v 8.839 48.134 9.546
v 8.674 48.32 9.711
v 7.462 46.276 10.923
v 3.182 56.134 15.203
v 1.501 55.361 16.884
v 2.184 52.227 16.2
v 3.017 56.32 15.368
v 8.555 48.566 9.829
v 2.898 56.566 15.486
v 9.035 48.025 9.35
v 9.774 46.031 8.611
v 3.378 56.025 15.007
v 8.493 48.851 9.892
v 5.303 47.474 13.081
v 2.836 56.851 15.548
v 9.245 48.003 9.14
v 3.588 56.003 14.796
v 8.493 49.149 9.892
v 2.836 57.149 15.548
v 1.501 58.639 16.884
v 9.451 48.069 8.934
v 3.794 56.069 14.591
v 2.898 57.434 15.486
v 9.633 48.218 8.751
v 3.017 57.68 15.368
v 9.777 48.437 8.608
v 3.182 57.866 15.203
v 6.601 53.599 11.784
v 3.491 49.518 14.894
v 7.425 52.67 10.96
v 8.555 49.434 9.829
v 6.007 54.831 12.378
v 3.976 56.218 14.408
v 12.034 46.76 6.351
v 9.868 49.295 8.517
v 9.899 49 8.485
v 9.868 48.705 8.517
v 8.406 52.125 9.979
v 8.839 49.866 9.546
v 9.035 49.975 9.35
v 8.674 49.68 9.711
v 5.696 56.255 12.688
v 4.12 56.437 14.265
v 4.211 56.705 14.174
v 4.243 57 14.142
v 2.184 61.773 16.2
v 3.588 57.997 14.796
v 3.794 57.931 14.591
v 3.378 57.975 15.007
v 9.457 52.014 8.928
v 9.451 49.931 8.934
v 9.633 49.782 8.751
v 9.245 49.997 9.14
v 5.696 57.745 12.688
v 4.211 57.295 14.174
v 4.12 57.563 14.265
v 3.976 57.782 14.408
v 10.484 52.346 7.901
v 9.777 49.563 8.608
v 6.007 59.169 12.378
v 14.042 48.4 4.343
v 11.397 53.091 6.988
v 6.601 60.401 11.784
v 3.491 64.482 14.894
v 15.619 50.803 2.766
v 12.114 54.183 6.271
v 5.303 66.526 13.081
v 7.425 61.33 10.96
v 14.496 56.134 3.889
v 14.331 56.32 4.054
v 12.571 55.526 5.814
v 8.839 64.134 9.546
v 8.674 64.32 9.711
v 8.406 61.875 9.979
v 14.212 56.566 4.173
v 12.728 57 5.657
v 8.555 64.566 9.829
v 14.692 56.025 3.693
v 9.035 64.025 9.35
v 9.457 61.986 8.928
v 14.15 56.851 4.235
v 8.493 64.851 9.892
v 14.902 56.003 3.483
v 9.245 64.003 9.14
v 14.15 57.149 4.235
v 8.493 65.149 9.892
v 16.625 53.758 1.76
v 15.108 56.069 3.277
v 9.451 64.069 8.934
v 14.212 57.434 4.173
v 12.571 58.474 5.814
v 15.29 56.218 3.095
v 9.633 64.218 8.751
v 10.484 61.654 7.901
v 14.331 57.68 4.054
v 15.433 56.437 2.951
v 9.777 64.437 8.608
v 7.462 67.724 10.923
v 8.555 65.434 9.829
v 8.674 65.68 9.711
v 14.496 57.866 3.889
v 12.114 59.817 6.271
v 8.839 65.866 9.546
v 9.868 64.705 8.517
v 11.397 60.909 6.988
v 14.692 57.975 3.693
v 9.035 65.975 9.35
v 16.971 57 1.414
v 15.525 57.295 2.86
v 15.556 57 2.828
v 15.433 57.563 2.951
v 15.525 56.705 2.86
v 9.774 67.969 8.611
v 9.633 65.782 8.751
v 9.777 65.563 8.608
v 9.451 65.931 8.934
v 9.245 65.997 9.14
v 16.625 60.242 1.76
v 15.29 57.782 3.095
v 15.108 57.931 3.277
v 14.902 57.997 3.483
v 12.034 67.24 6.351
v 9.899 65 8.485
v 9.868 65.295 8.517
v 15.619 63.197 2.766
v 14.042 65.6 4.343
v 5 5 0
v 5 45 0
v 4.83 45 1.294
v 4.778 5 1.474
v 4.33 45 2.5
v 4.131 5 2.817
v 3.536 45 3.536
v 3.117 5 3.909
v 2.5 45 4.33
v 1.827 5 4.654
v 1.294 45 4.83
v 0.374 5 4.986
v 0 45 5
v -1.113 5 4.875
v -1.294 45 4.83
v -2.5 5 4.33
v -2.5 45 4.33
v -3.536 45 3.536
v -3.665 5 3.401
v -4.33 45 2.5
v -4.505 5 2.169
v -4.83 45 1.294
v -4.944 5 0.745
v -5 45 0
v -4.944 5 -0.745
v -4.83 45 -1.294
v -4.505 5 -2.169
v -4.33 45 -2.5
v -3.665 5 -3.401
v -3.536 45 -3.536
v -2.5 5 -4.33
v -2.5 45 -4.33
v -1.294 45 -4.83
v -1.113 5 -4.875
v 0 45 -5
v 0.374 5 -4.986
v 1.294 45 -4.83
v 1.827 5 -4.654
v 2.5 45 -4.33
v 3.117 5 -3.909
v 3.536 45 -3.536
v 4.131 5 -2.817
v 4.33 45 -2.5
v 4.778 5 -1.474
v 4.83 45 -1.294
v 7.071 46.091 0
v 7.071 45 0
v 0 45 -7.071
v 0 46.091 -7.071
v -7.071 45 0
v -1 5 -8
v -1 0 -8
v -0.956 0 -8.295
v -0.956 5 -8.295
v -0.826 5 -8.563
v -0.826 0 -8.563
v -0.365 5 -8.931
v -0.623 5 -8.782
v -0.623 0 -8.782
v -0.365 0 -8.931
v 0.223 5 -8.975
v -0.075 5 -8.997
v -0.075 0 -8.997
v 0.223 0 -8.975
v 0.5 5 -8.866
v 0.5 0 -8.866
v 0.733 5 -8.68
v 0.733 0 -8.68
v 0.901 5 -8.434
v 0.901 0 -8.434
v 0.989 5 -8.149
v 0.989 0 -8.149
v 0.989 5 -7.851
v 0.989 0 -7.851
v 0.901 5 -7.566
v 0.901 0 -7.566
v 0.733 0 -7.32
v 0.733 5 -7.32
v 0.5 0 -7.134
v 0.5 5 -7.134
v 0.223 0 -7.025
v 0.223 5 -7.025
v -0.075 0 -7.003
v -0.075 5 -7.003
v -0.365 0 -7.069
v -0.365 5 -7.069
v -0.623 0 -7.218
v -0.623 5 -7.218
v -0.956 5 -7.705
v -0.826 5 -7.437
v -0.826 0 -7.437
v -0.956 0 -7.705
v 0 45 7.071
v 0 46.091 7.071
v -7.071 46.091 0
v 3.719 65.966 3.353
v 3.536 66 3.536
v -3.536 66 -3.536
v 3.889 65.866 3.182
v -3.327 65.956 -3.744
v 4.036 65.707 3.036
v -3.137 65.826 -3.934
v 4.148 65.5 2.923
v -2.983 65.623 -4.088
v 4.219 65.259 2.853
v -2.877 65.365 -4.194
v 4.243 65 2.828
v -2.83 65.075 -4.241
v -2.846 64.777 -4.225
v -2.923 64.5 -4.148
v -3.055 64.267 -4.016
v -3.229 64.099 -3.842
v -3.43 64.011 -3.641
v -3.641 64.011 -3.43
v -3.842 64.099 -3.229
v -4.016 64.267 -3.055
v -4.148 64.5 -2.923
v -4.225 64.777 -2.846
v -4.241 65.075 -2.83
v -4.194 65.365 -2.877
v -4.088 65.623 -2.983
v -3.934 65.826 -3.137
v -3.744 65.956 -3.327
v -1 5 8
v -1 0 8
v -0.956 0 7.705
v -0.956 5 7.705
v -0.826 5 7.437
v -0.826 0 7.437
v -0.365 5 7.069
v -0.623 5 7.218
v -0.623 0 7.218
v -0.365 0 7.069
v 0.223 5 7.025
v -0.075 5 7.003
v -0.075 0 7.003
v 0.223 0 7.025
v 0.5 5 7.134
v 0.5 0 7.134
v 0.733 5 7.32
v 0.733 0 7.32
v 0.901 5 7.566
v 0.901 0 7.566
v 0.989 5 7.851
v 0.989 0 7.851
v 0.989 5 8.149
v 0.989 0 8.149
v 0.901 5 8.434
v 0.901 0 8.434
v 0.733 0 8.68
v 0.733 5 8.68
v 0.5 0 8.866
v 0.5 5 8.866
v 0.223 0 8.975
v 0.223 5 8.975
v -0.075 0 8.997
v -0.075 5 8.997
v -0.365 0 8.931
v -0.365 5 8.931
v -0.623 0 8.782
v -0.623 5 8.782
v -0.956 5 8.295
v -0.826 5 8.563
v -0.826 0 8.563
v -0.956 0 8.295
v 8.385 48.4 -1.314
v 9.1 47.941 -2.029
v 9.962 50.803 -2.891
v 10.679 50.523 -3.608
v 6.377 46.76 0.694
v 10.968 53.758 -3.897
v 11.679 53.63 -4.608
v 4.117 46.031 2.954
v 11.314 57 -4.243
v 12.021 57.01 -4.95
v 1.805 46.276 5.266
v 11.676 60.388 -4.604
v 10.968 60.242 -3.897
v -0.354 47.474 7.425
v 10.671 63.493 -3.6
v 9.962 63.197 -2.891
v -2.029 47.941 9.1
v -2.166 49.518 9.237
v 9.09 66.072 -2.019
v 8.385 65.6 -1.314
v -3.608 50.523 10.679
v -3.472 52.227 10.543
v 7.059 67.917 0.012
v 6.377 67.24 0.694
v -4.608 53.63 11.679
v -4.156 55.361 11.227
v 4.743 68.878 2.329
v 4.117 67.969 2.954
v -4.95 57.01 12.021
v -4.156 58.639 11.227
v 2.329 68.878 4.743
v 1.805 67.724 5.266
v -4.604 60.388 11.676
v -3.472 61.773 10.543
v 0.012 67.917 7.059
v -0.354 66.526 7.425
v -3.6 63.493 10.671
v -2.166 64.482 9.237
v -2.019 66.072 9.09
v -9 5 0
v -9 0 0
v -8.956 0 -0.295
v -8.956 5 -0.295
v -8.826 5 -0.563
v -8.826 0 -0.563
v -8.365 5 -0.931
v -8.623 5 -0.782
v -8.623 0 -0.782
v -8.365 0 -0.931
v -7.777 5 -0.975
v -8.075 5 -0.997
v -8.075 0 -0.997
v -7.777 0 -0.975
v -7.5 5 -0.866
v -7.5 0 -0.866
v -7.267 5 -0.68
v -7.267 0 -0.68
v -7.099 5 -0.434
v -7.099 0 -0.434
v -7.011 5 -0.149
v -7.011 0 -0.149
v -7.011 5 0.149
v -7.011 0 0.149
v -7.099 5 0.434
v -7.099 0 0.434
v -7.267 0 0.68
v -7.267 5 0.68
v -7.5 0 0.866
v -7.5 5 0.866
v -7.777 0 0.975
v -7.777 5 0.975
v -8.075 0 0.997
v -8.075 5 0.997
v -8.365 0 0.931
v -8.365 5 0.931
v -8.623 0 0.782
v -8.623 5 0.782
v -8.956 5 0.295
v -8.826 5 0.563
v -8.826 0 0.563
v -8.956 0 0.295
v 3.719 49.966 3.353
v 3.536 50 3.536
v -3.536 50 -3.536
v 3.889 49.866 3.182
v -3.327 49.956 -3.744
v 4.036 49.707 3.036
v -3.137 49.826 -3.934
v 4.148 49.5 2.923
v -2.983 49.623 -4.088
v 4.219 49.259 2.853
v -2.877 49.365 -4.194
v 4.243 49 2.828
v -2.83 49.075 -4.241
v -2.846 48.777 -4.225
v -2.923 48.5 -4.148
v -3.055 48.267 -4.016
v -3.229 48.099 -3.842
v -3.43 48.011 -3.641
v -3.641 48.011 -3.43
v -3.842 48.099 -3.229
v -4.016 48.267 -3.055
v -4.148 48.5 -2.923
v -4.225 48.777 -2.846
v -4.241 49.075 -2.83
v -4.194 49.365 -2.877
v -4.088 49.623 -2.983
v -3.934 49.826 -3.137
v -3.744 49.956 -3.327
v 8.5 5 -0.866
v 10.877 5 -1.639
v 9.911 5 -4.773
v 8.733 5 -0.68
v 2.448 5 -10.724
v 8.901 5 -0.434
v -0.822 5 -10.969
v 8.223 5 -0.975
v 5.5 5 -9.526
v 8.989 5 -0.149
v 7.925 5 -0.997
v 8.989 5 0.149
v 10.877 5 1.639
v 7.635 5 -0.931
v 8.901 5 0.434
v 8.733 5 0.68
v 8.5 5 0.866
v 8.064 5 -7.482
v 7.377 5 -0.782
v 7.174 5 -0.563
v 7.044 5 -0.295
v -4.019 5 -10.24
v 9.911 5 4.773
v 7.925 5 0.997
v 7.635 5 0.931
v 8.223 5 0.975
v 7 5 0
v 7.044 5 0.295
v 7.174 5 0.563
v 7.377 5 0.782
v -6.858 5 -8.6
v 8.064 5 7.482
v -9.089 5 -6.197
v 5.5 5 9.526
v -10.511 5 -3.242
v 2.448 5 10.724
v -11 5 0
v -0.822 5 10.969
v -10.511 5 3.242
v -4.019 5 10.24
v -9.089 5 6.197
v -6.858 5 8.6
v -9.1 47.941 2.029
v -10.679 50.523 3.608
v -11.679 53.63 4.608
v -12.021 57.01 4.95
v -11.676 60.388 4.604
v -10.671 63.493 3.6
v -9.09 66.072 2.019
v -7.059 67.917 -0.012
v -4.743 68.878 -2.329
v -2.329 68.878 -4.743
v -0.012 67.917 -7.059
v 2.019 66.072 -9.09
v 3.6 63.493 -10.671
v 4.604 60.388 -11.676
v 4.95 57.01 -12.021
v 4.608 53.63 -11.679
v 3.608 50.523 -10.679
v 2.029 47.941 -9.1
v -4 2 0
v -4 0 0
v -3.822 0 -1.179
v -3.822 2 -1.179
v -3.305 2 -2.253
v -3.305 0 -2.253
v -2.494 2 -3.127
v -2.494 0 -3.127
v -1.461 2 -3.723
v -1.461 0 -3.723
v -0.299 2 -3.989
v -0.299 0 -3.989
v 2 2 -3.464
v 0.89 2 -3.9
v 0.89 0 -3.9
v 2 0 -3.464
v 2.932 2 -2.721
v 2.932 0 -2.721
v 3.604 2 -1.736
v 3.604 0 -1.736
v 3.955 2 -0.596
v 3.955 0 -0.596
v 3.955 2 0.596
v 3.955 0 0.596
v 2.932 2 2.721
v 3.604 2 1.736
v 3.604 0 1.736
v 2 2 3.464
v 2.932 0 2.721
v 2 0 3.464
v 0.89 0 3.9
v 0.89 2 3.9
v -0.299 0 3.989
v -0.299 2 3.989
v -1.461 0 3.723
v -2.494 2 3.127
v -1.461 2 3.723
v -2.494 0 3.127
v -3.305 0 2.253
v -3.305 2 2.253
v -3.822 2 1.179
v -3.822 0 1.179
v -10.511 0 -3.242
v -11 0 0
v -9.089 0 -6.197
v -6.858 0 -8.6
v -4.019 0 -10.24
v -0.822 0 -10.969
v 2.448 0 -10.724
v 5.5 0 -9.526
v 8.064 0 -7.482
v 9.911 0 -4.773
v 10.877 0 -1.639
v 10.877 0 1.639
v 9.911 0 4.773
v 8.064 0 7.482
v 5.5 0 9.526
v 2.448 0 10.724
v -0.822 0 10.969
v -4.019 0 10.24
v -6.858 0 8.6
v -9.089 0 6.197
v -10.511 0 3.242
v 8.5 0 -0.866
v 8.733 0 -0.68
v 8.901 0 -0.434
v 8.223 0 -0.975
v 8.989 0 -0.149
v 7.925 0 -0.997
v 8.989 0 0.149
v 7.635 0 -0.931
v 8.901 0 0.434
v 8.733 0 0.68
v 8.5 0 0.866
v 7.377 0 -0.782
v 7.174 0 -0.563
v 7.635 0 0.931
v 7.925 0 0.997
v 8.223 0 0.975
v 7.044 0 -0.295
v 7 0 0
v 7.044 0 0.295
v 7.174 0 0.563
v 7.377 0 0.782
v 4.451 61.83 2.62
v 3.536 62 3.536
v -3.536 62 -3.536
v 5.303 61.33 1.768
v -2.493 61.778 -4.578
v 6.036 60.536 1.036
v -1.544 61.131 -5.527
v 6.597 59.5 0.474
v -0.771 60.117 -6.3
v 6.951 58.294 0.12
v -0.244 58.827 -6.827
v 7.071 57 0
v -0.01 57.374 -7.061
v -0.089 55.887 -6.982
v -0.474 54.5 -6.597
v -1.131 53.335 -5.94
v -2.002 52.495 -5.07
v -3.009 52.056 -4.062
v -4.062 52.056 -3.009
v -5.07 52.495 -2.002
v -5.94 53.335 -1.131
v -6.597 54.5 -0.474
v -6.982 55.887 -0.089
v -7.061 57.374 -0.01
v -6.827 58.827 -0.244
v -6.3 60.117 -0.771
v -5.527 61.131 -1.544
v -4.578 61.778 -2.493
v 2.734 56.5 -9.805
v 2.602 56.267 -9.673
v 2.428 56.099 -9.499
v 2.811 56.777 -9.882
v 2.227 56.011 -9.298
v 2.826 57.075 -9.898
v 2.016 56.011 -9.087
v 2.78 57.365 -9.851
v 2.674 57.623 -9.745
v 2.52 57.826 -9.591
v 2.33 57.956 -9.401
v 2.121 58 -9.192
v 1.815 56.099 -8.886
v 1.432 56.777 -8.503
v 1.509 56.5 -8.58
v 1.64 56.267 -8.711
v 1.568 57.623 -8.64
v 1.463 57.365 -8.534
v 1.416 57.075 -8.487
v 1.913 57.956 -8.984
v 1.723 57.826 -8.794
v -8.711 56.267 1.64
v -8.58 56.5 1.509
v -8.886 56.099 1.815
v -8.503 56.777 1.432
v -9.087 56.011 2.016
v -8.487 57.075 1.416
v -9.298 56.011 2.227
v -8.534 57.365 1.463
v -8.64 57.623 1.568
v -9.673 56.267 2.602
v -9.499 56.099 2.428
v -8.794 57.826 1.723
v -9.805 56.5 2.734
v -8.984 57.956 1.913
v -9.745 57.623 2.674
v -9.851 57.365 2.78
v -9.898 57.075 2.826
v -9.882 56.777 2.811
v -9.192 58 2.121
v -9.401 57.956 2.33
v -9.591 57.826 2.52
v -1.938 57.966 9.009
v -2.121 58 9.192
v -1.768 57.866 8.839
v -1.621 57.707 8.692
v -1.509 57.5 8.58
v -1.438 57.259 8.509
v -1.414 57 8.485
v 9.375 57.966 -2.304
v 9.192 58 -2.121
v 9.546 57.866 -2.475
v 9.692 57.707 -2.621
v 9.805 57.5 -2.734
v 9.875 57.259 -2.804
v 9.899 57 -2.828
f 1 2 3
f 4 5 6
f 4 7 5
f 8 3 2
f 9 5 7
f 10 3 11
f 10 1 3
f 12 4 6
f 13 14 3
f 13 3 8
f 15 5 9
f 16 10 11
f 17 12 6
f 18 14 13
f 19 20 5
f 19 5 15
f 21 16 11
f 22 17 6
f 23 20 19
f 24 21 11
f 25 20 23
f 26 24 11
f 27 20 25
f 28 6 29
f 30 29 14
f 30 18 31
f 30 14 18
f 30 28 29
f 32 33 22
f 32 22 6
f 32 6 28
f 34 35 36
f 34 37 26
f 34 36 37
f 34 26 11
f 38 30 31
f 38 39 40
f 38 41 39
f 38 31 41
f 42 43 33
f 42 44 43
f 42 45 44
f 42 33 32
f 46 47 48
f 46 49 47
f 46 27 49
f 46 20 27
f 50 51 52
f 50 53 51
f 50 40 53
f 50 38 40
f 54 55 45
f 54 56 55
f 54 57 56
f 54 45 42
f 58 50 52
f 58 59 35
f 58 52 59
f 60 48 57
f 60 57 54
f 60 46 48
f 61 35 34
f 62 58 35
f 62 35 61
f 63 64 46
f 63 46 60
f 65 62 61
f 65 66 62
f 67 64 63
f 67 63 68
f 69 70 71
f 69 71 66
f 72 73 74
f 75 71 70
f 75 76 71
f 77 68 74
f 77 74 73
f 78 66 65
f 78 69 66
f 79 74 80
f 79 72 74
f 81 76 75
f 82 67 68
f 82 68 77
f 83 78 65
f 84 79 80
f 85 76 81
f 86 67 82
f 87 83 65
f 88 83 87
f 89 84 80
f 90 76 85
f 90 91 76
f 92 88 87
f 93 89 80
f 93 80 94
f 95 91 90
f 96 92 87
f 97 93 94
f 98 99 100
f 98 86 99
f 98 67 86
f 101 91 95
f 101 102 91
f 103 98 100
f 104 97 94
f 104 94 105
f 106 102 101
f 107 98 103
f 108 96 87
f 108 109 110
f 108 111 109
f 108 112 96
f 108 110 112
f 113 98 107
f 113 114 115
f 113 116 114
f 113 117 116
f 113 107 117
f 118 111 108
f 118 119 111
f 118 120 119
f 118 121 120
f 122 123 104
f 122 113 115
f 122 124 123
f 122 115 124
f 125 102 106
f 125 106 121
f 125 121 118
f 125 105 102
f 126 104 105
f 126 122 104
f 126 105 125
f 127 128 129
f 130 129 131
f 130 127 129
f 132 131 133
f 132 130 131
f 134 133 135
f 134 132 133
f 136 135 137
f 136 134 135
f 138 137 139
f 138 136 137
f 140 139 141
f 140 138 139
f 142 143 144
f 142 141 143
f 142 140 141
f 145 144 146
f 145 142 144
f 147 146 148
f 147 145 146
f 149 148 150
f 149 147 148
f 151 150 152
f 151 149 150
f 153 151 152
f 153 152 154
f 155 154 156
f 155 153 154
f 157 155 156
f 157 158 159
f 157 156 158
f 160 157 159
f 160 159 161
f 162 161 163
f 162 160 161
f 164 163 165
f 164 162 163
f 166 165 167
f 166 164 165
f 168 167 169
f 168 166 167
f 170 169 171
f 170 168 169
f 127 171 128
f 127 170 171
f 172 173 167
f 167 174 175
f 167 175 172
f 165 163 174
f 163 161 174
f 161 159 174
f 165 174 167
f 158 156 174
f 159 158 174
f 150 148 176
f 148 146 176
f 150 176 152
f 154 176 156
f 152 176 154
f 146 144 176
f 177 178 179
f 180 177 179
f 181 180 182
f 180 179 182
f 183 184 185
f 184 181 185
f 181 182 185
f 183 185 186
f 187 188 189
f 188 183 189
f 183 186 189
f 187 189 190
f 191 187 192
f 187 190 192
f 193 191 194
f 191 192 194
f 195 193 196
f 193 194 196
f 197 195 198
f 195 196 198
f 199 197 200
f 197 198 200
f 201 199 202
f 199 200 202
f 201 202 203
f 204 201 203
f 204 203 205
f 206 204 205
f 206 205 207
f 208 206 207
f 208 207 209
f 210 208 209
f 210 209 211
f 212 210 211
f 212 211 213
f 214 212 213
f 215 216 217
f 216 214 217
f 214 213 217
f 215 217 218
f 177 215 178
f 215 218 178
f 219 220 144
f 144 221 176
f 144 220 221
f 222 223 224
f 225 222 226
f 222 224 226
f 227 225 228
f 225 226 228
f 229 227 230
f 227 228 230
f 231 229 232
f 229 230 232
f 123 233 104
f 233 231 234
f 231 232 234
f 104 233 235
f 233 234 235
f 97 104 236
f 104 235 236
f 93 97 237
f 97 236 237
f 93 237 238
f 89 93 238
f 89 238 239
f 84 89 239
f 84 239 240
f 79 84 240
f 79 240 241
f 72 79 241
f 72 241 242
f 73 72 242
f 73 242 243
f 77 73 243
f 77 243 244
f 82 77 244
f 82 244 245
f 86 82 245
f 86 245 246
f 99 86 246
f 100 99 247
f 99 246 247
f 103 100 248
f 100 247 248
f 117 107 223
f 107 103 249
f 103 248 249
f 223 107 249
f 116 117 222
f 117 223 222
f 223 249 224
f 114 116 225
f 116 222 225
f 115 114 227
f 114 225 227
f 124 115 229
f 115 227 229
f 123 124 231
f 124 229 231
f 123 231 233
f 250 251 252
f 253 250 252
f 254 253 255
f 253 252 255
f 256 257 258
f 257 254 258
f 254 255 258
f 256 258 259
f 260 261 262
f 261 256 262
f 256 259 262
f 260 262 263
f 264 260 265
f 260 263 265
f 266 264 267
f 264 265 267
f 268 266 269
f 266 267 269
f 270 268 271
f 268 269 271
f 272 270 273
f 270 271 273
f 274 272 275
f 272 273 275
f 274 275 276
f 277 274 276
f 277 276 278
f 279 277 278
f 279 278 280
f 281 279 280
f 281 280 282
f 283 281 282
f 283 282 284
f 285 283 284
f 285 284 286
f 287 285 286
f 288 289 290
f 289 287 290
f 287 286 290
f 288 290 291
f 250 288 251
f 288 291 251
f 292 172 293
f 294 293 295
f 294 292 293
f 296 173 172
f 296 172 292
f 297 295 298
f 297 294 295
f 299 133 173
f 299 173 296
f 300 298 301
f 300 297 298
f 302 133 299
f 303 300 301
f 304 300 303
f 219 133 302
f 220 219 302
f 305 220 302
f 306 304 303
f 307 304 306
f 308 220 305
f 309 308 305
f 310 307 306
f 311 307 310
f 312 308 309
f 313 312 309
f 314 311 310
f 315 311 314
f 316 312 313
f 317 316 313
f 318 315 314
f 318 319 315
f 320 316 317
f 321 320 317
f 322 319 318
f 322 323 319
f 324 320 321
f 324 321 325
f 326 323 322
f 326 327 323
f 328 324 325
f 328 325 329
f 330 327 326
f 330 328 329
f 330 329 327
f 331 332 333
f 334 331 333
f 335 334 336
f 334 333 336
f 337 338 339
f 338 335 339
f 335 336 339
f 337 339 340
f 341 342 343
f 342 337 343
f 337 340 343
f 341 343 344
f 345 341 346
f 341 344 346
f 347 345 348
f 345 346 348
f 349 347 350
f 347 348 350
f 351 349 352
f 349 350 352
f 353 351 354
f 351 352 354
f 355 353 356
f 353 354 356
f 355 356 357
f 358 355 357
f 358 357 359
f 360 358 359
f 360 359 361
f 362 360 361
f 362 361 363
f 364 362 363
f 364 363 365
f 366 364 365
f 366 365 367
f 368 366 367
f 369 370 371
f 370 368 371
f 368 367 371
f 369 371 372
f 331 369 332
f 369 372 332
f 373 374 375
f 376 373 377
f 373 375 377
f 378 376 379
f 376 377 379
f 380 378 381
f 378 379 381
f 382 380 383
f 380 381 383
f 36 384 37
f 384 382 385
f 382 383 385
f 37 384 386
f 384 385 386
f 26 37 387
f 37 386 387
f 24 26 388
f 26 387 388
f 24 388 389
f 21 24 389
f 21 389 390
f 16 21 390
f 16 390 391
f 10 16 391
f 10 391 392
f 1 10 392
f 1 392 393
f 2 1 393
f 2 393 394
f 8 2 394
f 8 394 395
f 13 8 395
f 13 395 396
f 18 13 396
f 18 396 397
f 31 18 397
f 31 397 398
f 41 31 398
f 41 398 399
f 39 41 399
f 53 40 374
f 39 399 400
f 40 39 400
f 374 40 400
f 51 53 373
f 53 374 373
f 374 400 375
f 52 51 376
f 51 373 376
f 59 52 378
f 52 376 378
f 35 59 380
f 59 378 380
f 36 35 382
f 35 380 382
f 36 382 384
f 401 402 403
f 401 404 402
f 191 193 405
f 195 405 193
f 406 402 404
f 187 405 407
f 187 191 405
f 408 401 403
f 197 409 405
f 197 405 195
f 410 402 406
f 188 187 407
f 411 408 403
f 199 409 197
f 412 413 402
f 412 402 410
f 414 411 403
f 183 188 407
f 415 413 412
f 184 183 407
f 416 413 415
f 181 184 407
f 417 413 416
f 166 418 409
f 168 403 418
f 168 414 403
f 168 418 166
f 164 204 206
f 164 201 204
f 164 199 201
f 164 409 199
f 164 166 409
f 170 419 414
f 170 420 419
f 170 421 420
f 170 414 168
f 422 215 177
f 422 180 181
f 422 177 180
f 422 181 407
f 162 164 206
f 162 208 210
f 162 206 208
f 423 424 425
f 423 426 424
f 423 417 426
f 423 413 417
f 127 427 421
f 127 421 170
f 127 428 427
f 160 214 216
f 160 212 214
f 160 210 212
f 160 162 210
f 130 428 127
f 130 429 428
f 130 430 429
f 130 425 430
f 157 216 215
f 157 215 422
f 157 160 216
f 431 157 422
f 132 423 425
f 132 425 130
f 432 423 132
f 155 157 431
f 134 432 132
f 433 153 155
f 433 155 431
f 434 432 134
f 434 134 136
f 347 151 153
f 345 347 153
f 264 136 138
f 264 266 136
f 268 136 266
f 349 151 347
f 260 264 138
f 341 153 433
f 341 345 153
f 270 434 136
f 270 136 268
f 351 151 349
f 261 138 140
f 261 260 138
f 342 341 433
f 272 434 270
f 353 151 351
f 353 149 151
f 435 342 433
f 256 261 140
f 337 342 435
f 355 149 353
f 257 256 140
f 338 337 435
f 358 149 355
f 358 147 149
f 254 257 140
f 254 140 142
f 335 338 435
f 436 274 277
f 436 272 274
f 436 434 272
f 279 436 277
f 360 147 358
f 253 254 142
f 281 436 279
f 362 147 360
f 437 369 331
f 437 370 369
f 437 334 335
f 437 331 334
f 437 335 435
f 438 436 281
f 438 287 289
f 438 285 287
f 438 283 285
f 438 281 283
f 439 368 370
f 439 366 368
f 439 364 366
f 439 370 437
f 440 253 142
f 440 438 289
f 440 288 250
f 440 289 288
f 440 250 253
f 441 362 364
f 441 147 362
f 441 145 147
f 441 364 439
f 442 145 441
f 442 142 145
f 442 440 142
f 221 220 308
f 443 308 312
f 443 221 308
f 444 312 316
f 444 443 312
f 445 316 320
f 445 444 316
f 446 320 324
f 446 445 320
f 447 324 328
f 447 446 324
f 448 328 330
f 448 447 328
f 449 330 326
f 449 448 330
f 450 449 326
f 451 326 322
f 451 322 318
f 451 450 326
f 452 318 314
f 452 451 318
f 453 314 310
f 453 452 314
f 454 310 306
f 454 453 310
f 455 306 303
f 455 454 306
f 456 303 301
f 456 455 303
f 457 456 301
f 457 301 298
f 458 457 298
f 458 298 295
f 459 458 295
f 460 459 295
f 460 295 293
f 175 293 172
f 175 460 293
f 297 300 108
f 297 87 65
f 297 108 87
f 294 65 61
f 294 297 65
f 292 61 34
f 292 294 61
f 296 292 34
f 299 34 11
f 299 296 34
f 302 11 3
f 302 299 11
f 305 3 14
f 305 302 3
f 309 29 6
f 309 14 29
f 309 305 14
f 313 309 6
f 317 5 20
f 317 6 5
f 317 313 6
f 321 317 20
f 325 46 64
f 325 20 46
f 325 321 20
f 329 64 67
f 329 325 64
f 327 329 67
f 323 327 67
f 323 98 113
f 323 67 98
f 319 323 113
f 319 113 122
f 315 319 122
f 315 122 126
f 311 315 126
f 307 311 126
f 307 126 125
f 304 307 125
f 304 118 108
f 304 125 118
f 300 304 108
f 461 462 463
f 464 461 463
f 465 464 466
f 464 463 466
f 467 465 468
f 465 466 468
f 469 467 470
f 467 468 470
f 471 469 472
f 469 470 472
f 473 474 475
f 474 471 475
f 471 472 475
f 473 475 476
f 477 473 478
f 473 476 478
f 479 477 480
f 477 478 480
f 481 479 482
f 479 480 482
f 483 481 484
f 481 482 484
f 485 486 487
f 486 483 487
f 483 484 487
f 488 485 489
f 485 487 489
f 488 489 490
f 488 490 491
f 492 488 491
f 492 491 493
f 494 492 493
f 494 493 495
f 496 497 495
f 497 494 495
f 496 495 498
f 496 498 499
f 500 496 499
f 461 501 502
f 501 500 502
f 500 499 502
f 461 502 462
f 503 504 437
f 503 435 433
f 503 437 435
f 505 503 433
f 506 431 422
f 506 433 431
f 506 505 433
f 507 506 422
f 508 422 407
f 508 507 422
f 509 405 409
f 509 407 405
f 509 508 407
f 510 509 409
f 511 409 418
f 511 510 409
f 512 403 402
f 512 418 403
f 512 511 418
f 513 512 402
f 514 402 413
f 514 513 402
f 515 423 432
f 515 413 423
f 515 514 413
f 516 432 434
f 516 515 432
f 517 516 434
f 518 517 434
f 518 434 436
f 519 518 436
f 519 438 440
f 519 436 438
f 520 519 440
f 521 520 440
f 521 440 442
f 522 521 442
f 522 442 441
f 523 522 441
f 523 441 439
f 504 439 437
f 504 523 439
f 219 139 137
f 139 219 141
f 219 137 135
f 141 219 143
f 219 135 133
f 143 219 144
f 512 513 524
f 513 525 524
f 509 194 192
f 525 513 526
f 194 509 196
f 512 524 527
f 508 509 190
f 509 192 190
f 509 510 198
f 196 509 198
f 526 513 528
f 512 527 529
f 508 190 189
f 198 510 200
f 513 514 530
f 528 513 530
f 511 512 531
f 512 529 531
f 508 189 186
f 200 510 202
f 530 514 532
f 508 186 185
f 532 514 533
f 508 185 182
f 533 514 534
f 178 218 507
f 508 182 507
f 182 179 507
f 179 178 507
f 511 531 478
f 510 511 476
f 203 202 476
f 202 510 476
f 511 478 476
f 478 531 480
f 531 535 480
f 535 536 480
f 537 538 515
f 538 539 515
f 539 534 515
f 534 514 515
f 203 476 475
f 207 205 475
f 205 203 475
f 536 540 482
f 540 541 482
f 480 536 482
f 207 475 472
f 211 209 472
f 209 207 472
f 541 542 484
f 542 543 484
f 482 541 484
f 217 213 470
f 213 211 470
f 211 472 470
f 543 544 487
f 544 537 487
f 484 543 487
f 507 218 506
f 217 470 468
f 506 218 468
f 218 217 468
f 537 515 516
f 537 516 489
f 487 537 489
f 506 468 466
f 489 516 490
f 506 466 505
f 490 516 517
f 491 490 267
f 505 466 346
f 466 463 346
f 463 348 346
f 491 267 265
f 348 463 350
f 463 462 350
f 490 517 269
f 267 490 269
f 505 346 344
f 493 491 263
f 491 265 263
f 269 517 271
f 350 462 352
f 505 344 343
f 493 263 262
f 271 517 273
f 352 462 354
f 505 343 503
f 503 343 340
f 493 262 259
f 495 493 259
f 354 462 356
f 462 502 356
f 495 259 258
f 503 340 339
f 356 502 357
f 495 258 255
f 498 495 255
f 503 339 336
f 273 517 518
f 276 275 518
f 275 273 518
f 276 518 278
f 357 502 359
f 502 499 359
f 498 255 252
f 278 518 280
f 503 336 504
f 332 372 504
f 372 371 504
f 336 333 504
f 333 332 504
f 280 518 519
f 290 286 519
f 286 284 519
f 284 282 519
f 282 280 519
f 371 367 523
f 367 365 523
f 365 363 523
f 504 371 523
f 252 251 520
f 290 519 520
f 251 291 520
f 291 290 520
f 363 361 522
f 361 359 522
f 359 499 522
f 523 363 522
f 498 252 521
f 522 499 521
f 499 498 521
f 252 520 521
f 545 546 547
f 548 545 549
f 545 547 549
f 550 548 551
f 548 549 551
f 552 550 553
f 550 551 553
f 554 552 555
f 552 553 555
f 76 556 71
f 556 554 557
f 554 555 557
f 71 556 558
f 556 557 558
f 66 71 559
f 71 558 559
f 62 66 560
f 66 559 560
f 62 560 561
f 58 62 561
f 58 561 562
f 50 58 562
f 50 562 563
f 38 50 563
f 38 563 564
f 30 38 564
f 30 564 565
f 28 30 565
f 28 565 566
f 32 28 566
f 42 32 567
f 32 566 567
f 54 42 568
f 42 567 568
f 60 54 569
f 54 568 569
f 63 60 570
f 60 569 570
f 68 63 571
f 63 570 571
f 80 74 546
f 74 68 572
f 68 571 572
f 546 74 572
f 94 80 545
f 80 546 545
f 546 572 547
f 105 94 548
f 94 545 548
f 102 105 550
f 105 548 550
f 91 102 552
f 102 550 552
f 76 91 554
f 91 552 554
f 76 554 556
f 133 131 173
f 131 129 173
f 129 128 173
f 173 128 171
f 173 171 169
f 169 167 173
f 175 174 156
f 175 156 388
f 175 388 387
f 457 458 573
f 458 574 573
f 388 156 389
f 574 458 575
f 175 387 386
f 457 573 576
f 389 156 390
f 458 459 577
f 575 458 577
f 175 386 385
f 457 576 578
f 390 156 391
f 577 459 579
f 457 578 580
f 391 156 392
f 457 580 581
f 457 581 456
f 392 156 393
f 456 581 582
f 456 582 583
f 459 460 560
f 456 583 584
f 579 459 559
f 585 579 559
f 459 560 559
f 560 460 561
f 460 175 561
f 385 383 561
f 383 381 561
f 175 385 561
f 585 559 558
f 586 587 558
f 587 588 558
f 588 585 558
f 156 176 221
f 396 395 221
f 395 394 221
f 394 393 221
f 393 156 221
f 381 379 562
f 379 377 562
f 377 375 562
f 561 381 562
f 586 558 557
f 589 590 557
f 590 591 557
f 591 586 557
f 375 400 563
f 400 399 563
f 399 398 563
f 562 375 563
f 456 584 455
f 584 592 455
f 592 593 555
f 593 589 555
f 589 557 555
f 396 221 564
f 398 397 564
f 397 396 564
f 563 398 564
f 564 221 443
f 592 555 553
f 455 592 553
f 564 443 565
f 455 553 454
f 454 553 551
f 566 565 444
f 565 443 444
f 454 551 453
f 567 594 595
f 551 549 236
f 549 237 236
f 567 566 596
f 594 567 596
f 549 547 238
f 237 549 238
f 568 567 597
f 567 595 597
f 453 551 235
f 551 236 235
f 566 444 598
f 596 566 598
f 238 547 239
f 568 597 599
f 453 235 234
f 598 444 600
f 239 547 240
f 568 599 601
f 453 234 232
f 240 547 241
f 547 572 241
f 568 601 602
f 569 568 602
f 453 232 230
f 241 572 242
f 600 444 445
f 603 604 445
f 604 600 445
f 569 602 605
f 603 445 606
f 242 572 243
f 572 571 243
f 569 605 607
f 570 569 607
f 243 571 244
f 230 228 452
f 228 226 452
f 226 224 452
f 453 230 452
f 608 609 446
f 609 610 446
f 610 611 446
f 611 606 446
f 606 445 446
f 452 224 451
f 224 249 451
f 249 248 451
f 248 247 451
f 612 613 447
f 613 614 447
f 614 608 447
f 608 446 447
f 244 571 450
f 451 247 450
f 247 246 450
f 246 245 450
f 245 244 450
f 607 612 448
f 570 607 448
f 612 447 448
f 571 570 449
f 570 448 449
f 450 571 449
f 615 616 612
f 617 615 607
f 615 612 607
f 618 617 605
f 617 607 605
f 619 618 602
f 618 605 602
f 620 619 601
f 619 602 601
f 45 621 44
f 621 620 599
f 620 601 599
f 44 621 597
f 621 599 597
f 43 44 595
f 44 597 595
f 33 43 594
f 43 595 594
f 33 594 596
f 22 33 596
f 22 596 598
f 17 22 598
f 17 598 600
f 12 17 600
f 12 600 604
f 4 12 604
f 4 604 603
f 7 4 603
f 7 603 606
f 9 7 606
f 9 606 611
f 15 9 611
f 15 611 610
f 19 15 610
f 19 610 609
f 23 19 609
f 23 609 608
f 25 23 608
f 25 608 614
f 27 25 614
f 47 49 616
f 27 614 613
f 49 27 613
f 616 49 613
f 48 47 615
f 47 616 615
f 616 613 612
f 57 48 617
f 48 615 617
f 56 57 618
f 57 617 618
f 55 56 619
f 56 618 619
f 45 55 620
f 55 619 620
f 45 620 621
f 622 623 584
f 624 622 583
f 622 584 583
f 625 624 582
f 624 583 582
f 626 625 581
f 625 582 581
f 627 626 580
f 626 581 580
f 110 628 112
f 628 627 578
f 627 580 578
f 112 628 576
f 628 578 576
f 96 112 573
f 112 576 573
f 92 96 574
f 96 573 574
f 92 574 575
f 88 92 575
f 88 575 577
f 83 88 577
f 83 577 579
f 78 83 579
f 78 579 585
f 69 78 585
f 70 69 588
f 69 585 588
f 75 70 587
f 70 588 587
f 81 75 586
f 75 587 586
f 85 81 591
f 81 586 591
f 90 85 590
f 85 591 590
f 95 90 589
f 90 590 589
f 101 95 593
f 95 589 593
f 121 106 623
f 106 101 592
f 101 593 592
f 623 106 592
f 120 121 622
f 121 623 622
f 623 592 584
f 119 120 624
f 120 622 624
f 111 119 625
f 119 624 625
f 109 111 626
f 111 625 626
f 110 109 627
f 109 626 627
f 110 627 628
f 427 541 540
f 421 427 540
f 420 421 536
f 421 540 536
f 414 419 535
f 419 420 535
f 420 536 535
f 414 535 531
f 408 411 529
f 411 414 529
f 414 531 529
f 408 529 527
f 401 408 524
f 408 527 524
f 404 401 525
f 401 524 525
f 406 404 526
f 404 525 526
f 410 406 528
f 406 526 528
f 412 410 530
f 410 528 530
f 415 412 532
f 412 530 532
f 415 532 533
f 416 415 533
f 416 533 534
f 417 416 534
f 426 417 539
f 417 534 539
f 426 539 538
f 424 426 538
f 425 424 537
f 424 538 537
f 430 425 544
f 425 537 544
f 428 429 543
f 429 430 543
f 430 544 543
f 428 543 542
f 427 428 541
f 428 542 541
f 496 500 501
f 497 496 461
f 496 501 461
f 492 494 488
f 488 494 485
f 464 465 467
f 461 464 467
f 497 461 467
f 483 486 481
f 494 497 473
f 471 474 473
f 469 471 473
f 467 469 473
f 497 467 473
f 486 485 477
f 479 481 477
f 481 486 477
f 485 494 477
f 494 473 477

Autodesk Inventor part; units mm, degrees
ref_plane "YZ Plane" through (0, 0, 0) normal (1, 0, 0) x (0, 1, 0)
ref_plane "XZ Plane" through (0, 0, 0) normal (0, 1, 0) x (-1, 0, 0)
sketch "Esquisse1" plane through (0, 0, 0) normal (0, 1, 0) x (-1, 0, 0)
  circle A0 centre (0, 0) radius 11
  line L0 (0, 0) -> (-8, 0) construction
  circle A1 centre (-8, 0) radius 1
  circle A2 centre (0, -8) radius 1
  circle A3 centre (8, 0) radius 1
  circle A4 centre (0, 8) radius 1
  circle A5 centre (0, 0) radius 4
  dimension "d0" = 22
  dimension "d1" = 8
  dimension "d2" = 2
  dimension "d5" = 360
  dimension "d7" = 8
extrude "Extrusion1" add sketch "Esquisse1" along normal blind 5
sketch "Esquisse2" plane through (0, 5, 0) normal (0, 1, 0) x (1, 0, 0)
  circle A0 centre (0, 0) radius 4 projected
extrude "Extrusion2" add sketch "Esquisse2" against normal blind 3
sketch "Esquisse3" plane through (0, 5, 0) normal (0, 1, 0) x (1, 0, 0)
  circle A0 centre (0, 0) radius 11 projected
  circle A1 centre (0, 0) radius 5
  dimension "d12" = 10
extrude "Extrusion3" add sketch "Esquisse3" along normal blind 40 contours A1
ref_plane "Plan de construction1" through (0, 0, 0) normal (0.7071, 0, 0.7071) x (0, 1, 0)
sketch "Esquisse4" plane through (0, 0, 0) normal (0.7071, 0, 0.7071) x (0, 1, 0)
  line L0 (0, 0) -> (5, 0) construction
  line L1 (5, 0) -> (5, -5) construction
  line L2 (5, 0) -> (5, 5)
  line L3 (5, 0) -> (5, -5)
  line L4 (0, 0) -> (45, 0) construction
  line L5 (45, 0) -> (57, 0) construction
  circle A0 centre (57, 0) radius 12
  circle A1 centre (57, 0) radius 8 construction
  line L6 (0, 0) -> (45, 0) construction
  line L7 (45, 0) -> (57, 0) construction
  circle A2 centre (65, 0) radius 1
  circle A3 centre (57, 8) radius 1
  circle A4 centre (49, 0) radius 1
  circle A5 centre (57, -8) radius 1
  circle A6 centre (57, 0) radius 5
  line L8 (46.0913, 5) -> (45, 5)
  line L9 (45, 5) -> (45, 0)
  line L10 (45, -5) -> (46.0913, -5)
  line L11 (45, 0) -> (45, -5)
  dimension "d53" = 16
  dimension "d36" = 45
  dimension "d52" = 12
  dimension "d54" = 2
  dimension "d57" = 360
  dimension "d59" = 10
extrude "Extrusion6" add sketch "Esquisse4" along normal mid plane 10
sketch "Esquisse5" plane through (3.5355, 0, 3.5355) normal (0.7071, 0, 0.7071) x (0.7071, 0, -0.7071)
  circle A0 centre (0, 57) radius 5 projected
  circle A1 centre (8, 57) radius 1 projected
  circle A2 centre (0, 49) radius 1 projected
  circle A3 centre (-8, 57) radius 1 projected
  circle A4 centre (0, 65) radius 1 projected
  arc A5 (5, 46.0913) -> (-5, 46.0913) centre (0, 57) ccw projected
  circle A6 centre (0, 57) radius 5
  circle A7 centre (0, 57) radius 11
  circle A8 centre (0, 65) radius 1
  circle A9 centre (8, 57) radius 1
  circle A10 centre (0, 49) radius 1
  circle A11 centre (-8, 57) radius 1
  point P0 (0, 0)
  dimension "d64" = 22
extrude "Extrusion7" add sketch "Esquisse5" along normal blind 8
properties part number "neck_v2.1"
